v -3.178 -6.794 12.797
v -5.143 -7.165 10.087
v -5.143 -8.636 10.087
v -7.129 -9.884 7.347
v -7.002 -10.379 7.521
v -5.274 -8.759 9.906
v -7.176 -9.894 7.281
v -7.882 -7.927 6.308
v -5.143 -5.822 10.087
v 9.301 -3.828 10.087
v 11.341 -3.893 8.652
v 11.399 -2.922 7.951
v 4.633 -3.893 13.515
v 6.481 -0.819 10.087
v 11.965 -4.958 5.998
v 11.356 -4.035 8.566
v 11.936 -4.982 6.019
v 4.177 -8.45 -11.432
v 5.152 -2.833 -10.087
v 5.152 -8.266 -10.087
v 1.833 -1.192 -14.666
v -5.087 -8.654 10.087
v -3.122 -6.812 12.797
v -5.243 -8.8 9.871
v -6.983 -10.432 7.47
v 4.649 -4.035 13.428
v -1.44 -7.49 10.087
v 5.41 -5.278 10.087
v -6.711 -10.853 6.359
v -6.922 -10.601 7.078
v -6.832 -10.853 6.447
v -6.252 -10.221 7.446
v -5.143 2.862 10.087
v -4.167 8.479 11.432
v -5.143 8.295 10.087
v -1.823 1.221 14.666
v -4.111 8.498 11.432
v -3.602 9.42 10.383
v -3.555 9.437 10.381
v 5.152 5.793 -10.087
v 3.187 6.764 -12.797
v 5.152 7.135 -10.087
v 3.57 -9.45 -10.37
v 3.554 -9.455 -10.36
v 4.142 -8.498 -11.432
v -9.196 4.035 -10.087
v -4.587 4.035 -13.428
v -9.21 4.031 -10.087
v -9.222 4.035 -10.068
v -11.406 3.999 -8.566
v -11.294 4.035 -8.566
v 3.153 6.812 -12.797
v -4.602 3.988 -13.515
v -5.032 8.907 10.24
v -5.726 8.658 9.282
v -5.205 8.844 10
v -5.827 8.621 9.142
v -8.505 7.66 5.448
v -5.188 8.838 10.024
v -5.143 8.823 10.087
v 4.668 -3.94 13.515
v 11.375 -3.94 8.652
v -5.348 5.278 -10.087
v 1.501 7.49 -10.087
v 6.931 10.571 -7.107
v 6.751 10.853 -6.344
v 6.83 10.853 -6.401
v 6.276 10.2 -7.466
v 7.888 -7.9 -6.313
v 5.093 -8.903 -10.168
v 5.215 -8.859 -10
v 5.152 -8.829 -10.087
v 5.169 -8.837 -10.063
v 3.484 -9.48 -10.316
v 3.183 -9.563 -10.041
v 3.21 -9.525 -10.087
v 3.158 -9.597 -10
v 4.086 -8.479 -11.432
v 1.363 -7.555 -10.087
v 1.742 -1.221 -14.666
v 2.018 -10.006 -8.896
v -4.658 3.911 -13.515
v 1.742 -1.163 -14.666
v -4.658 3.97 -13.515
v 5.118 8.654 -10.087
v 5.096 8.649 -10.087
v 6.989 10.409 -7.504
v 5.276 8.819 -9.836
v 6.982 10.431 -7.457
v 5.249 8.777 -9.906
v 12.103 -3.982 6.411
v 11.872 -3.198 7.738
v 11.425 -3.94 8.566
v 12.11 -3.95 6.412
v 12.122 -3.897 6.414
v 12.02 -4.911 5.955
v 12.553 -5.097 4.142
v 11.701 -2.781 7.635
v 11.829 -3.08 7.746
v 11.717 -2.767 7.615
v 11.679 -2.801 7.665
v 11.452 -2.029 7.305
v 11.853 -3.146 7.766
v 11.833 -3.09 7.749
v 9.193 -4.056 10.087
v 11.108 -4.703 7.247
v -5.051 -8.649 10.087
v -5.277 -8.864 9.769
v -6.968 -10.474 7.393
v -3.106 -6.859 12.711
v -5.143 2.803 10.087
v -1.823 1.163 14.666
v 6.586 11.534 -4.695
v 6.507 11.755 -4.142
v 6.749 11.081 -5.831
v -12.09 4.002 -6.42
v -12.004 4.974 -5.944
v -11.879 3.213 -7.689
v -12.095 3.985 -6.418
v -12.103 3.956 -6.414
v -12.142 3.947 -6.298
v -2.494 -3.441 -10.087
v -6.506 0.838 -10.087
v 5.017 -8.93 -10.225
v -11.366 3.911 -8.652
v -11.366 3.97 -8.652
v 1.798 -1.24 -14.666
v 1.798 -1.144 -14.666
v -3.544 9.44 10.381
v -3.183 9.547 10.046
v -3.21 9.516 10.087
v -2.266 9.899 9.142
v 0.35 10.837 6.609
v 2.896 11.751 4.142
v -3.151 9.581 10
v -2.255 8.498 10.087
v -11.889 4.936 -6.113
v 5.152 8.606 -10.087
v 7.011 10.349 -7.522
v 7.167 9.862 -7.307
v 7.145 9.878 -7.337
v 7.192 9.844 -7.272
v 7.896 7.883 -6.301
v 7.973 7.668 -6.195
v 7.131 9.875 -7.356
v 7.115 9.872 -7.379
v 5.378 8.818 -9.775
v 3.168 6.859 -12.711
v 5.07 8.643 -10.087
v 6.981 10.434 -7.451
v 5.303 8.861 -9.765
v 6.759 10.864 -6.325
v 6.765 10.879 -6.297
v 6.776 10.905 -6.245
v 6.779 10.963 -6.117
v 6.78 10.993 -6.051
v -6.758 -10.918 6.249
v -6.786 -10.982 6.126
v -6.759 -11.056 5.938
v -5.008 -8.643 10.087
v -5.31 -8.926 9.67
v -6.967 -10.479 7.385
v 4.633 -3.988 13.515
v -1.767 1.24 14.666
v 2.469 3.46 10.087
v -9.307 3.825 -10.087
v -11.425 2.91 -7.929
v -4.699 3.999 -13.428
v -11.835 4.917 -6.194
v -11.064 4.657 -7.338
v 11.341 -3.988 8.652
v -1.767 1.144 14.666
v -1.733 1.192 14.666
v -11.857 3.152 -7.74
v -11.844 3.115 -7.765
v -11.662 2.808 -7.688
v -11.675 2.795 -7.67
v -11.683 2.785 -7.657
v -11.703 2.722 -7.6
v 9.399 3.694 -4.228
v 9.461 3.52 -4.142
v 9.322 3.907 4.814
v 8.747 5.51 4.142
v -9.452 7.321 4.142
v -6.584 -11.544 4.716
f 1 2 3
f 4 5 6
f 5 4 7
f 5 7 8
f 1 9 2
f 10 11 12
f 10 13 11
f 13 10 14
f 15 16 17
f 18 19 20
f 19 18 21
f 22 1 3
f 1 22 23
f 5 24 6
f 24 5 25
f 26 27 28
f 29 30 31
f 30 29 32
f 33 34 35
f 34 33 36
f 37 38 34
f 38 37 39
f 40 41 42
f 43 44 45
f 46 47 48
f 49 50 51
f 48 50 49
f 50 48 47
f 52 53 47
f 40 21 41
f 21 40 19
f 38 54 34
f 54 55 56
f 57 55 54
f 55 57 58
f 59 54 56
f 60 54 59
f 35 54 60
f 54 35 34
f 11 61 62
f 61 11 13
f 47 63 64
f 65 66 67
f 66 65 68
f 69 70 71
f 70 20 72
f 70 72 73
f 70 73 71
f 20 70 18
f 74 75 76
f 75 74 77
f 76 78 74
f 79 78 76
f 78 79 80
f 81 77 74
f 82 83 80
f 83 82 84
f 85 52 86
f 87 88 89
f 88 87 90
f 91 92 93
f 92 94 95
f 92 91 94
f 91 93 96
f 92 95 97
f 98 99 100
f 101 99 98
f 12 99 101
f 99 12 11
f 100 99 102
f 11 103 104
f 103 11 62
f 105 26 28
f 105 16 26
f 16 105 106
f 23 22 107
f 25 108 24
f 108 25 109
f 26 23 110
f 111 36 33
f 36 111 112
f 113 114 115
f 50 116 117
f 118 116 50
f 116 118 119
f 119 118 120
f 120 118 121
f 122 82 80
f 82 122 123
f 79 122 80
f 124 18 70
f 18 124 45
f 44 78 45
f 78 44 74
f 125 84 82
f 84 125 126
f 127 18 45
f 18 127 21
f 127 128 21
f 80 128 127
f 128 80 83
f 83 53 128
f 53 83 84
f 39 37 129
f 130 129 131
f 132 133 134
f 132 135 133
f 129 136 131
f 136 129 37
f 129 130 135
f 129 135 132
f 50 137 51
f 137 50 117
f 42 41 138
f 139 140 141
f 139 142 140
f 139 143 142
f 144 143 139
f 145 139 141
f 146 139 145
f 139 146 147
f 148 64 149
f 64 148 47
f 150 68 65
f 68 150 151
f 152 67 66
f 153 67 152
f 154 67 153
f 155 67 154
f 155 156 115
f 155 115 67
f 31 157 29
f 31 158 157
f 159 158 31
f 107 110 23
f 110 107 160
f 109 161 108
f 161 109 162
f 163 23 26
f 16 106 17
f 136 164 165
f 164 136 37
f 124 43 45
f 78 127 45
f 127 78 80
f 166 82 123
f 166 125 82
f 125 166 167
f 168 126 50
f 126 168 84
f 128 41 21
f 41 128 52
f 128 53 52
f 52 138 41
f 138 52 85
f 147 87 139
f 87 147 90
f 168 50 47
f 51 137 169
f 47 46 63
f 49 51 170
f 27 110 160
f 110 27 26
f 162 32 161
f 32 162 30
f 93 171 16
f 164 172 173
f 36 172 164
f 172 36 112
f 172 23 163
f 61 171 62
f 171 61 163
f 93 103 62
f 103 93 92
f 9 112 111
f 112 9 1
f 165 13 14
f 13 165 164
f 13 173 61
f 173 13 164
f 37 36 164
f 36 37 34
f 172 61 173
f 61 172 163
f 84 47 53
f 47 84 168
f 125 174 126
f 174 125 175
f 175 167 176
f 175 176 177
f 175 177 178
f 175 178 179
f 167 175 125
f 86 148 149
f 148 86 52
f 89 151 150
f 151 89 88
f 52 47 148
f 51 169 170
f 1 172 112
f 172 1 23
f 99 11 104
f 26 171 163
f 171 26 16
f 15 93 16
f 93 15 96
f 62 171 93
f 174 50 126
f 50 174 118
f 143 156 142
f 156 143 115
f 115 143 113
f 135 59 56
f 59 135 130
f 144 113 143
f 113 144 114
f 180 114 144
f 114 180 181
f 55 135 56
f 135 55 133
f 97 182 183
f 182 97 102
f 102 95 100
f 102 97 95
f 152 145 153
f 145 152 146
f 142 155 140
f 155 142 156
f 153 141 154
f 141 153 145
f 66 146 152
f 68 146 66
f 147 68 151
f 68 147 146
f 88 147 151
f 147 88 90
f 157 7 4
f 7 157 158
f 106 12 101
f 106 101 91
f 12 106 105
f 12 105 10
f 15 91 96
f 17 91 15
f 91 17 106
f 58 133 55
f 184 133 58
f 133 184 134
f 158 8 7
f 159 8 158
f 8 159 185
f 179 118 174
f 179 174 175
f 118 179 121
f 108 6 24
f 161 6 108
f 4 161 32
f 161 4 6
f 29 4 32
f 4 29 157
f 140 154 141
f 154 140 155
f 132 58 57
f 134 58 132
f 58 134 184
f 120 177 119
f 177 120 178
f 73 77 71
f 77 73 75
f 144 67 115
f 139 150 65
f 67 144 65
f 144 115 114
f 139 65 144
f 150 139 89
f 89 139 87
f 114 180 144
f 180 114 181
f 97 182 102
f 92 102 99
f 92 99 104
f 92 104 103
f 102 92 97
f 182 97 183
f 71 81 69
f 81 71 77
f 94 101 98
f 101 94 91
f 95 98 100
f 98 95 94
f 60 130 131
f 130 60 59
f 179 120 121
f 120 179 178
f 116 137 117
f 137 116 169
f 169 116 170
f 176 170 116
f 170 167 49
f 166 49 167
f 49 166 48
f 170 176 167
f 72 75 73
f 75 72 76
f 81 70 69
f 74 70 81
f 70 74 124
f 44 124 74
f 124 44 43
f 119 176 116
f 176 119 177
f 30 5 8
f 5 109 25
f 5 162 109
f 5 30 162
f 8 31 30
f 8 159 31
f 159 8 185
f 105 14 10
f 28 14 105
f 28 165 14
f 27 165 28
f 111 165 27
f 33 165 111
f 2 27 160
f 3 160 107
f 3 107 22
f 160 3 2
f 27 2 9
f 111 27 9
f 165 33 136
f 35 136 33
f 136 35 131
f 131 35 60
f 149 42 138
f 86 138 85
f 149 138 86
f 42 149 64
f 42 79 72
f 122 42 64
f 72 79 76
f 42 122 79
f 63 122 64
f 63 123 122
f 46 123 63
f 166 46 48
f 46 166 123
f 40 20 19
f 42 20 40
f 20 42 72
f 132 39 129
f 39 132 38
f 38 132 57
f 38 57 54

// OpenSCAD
// Auto-generated OpenSCAD file

    inner_points = 10*[[-0.8013612660891973, -0.727593977755231, 1.000000000000023], [-0.8013612660891858, -0.7275939777553072, -0.999999999999977], [1.0811346210531376, -0.05216134981059809, 1.0000000000000082], [-1.0811346210531652, 0.05216134981069553, 0.9999999999999918], [0.8013612660891698, 0.7275939777553287, 0.999999999999977], [-1.0811346210531536, 0.052161349810619616, -1.0000000000000082], [1.0811346210531492, -0.052161349810674, -0.9999999999999918], [0.8013612660891813, 0.7275939777552526, -1.000000000000023], [-0.05216134981066051, -1.0811346210531028, 1.0000000000000406], [-0.052161349810649044, -1.0811346210531787, -0.9999999999999593], [0.7275939777552661, -0.8013612660891348, 1.0000000000000346], [-0.7275939777552936, 0.8013612660892324, 0.9999999999999655], [0.05216134981063311, 1.0811346210532, 0.9999999999999593], [-0.7275939777552821, 0.8013612660891564, -1.0000000000000346], [0.7275939777552776, -0.8013612660892109, -0.9999999999999655], [0.052161349810644575, 1.081134621053124, -1.0000000000000406], [-0.6035316295988613, -1.2789642575434574, 0.4142135623731402], [-0.6035316295988565, -1.2789642575434892, -0.41421356237305007], [1.2789642575434734, -0.6035316295988246, 0.4142135623731254], [-1.2789642575434943, 0.6035316295988774, 0.4142135623730649], [0.6035316295988405, 1.2789642575435105, 0.41421356237305007], [-1.2789642575434894, 0.6035316295988461, -0.4142135623731254], [1.2789642575434783, -0.6035316295988559, -0.4142135623730649], [0.6035316295988453, 1.2789642575434788, -0.4142135623731402]];

    outer_points = 10*[[-0.41266163720092336, 0.8449974377225808, 1.1345759466332506], [1.20665376354879, 0.8449974377225808, -0.039228821160267824], [-1.4410524893355916, -0.11919796908464814, -0.28413454981680875], [-0.17826291141412176, 0.11919796908464814, 1.457939317610327], [-1.20665376354879, -0.8449974377225808, 0.039228821160267824], [1.4410524893355916, 0.11919796908464814, 0.28413454981680875], [0.17826291141412176, -0.11919796908464814, -1.457939317610327], [0.41266163720092336, -0.8449974377225808, -1.1345759466332506], [-0.8796152725862888, 1.0758088675131403, 0.4903928303583297], [0.7397001281634245, 1.0758088675131403, -0.6834119374351887], [-1.3055887109608926, 0.6764260532357422, -0.09725629835235172], [-0.3137266897888206, -0.6764260532357422, 1.27106106614587], [-0.7397001281634245, -1.0758088675131403, 0.6834119374351887], [1.3055887109608926, -0.6764260532357422, 0.09725629835235172], [0.3137266897888206, 0.6764260532357422, -1.27106106614587], [0.8796152725862888, -1.0758088675131403, -0.4903928303583297], [-0.1041200657064775, 1.3582151637780557, 0.5621240575303981], [0.5666223350436774, 1.3582151637780557, 0.075918203132121], [-1.1325109178411457, 0.3940197569708268, -0.8565864389196614], [0.4617685170909907, -0.3940197569708268, 1.3427922933179384], [-0.5666223350436774, -1.3582151637780557, -0.075918203132121], [1.1325109178411457, -0.3940197569708268, 0.8565864389196614], [-0.4617685170909907, 0.3940197569708268, -1.3427922933179384], [0.1041200657064775, -1.3582151637780557, -0.5621240575303981]];

    // Convex hull for inner set (I)
    module inner_hull() {
        hull() {
            for (p = inner_points) {
                translate(p) sphere(r=0.1);
            }
        }
    }

    // Convex hull for outer set (O) minus inner hull (O \ I)
    module outer_minus_inner() {
        difference() {
            hull() {
                for (p = outer_points) {
                    translate(p) sphere(r=0.1);
                }
            }
            inner_hull(); // Subtract inner hull
        }
    }

    // Convex hull for outer set (O) minus all translated inner hulls
    module outer_minus_AllTranslationInner() {
        difference() {
            hull() {
                for (p = outer_points) {
                    translate(p) sphere(r=0.1);
                }
            }
            hull() {
                translate([0,0,5]) inner_hull();
                translate([0,0,-5]) inner_hull();
            }; // Subtract translated inner hulls
        }
    }

    // Difference between outer_minus_inner and outer_minus_AllTranslationInner
    module outer_minus_inner_diff() {
        difference() {
            // Outer minus inner
            difference() {
                hull() {
                    for (p = outer_points) {
                        translate(p) sphere(r=0.1);
                    }
                }
                inner_hull();
            }

            // Subtract Outer minus AllTranslationInner
            difference() {
                hull() {
                    for (p = outer_points) {
                        translate(p) sphere(r=0.1);
                    }
                }
                hull() {
                    translate([0,0,5]) inner_hull();
                    translate([0,0,-5]) inner_hull();
                };
            }
        }
    }

    // Rendering all with colors applied
    // color([1, 0, 0, 0.5]) inner_hull(); // Transparent red
    // color([0, 1, 0, 1]) outer_minus_AllTranslationInner(); // Opaque green
    color([1, 1, 0, 1]) outer_minus_inner_diff(); // Opaque yellow
    
